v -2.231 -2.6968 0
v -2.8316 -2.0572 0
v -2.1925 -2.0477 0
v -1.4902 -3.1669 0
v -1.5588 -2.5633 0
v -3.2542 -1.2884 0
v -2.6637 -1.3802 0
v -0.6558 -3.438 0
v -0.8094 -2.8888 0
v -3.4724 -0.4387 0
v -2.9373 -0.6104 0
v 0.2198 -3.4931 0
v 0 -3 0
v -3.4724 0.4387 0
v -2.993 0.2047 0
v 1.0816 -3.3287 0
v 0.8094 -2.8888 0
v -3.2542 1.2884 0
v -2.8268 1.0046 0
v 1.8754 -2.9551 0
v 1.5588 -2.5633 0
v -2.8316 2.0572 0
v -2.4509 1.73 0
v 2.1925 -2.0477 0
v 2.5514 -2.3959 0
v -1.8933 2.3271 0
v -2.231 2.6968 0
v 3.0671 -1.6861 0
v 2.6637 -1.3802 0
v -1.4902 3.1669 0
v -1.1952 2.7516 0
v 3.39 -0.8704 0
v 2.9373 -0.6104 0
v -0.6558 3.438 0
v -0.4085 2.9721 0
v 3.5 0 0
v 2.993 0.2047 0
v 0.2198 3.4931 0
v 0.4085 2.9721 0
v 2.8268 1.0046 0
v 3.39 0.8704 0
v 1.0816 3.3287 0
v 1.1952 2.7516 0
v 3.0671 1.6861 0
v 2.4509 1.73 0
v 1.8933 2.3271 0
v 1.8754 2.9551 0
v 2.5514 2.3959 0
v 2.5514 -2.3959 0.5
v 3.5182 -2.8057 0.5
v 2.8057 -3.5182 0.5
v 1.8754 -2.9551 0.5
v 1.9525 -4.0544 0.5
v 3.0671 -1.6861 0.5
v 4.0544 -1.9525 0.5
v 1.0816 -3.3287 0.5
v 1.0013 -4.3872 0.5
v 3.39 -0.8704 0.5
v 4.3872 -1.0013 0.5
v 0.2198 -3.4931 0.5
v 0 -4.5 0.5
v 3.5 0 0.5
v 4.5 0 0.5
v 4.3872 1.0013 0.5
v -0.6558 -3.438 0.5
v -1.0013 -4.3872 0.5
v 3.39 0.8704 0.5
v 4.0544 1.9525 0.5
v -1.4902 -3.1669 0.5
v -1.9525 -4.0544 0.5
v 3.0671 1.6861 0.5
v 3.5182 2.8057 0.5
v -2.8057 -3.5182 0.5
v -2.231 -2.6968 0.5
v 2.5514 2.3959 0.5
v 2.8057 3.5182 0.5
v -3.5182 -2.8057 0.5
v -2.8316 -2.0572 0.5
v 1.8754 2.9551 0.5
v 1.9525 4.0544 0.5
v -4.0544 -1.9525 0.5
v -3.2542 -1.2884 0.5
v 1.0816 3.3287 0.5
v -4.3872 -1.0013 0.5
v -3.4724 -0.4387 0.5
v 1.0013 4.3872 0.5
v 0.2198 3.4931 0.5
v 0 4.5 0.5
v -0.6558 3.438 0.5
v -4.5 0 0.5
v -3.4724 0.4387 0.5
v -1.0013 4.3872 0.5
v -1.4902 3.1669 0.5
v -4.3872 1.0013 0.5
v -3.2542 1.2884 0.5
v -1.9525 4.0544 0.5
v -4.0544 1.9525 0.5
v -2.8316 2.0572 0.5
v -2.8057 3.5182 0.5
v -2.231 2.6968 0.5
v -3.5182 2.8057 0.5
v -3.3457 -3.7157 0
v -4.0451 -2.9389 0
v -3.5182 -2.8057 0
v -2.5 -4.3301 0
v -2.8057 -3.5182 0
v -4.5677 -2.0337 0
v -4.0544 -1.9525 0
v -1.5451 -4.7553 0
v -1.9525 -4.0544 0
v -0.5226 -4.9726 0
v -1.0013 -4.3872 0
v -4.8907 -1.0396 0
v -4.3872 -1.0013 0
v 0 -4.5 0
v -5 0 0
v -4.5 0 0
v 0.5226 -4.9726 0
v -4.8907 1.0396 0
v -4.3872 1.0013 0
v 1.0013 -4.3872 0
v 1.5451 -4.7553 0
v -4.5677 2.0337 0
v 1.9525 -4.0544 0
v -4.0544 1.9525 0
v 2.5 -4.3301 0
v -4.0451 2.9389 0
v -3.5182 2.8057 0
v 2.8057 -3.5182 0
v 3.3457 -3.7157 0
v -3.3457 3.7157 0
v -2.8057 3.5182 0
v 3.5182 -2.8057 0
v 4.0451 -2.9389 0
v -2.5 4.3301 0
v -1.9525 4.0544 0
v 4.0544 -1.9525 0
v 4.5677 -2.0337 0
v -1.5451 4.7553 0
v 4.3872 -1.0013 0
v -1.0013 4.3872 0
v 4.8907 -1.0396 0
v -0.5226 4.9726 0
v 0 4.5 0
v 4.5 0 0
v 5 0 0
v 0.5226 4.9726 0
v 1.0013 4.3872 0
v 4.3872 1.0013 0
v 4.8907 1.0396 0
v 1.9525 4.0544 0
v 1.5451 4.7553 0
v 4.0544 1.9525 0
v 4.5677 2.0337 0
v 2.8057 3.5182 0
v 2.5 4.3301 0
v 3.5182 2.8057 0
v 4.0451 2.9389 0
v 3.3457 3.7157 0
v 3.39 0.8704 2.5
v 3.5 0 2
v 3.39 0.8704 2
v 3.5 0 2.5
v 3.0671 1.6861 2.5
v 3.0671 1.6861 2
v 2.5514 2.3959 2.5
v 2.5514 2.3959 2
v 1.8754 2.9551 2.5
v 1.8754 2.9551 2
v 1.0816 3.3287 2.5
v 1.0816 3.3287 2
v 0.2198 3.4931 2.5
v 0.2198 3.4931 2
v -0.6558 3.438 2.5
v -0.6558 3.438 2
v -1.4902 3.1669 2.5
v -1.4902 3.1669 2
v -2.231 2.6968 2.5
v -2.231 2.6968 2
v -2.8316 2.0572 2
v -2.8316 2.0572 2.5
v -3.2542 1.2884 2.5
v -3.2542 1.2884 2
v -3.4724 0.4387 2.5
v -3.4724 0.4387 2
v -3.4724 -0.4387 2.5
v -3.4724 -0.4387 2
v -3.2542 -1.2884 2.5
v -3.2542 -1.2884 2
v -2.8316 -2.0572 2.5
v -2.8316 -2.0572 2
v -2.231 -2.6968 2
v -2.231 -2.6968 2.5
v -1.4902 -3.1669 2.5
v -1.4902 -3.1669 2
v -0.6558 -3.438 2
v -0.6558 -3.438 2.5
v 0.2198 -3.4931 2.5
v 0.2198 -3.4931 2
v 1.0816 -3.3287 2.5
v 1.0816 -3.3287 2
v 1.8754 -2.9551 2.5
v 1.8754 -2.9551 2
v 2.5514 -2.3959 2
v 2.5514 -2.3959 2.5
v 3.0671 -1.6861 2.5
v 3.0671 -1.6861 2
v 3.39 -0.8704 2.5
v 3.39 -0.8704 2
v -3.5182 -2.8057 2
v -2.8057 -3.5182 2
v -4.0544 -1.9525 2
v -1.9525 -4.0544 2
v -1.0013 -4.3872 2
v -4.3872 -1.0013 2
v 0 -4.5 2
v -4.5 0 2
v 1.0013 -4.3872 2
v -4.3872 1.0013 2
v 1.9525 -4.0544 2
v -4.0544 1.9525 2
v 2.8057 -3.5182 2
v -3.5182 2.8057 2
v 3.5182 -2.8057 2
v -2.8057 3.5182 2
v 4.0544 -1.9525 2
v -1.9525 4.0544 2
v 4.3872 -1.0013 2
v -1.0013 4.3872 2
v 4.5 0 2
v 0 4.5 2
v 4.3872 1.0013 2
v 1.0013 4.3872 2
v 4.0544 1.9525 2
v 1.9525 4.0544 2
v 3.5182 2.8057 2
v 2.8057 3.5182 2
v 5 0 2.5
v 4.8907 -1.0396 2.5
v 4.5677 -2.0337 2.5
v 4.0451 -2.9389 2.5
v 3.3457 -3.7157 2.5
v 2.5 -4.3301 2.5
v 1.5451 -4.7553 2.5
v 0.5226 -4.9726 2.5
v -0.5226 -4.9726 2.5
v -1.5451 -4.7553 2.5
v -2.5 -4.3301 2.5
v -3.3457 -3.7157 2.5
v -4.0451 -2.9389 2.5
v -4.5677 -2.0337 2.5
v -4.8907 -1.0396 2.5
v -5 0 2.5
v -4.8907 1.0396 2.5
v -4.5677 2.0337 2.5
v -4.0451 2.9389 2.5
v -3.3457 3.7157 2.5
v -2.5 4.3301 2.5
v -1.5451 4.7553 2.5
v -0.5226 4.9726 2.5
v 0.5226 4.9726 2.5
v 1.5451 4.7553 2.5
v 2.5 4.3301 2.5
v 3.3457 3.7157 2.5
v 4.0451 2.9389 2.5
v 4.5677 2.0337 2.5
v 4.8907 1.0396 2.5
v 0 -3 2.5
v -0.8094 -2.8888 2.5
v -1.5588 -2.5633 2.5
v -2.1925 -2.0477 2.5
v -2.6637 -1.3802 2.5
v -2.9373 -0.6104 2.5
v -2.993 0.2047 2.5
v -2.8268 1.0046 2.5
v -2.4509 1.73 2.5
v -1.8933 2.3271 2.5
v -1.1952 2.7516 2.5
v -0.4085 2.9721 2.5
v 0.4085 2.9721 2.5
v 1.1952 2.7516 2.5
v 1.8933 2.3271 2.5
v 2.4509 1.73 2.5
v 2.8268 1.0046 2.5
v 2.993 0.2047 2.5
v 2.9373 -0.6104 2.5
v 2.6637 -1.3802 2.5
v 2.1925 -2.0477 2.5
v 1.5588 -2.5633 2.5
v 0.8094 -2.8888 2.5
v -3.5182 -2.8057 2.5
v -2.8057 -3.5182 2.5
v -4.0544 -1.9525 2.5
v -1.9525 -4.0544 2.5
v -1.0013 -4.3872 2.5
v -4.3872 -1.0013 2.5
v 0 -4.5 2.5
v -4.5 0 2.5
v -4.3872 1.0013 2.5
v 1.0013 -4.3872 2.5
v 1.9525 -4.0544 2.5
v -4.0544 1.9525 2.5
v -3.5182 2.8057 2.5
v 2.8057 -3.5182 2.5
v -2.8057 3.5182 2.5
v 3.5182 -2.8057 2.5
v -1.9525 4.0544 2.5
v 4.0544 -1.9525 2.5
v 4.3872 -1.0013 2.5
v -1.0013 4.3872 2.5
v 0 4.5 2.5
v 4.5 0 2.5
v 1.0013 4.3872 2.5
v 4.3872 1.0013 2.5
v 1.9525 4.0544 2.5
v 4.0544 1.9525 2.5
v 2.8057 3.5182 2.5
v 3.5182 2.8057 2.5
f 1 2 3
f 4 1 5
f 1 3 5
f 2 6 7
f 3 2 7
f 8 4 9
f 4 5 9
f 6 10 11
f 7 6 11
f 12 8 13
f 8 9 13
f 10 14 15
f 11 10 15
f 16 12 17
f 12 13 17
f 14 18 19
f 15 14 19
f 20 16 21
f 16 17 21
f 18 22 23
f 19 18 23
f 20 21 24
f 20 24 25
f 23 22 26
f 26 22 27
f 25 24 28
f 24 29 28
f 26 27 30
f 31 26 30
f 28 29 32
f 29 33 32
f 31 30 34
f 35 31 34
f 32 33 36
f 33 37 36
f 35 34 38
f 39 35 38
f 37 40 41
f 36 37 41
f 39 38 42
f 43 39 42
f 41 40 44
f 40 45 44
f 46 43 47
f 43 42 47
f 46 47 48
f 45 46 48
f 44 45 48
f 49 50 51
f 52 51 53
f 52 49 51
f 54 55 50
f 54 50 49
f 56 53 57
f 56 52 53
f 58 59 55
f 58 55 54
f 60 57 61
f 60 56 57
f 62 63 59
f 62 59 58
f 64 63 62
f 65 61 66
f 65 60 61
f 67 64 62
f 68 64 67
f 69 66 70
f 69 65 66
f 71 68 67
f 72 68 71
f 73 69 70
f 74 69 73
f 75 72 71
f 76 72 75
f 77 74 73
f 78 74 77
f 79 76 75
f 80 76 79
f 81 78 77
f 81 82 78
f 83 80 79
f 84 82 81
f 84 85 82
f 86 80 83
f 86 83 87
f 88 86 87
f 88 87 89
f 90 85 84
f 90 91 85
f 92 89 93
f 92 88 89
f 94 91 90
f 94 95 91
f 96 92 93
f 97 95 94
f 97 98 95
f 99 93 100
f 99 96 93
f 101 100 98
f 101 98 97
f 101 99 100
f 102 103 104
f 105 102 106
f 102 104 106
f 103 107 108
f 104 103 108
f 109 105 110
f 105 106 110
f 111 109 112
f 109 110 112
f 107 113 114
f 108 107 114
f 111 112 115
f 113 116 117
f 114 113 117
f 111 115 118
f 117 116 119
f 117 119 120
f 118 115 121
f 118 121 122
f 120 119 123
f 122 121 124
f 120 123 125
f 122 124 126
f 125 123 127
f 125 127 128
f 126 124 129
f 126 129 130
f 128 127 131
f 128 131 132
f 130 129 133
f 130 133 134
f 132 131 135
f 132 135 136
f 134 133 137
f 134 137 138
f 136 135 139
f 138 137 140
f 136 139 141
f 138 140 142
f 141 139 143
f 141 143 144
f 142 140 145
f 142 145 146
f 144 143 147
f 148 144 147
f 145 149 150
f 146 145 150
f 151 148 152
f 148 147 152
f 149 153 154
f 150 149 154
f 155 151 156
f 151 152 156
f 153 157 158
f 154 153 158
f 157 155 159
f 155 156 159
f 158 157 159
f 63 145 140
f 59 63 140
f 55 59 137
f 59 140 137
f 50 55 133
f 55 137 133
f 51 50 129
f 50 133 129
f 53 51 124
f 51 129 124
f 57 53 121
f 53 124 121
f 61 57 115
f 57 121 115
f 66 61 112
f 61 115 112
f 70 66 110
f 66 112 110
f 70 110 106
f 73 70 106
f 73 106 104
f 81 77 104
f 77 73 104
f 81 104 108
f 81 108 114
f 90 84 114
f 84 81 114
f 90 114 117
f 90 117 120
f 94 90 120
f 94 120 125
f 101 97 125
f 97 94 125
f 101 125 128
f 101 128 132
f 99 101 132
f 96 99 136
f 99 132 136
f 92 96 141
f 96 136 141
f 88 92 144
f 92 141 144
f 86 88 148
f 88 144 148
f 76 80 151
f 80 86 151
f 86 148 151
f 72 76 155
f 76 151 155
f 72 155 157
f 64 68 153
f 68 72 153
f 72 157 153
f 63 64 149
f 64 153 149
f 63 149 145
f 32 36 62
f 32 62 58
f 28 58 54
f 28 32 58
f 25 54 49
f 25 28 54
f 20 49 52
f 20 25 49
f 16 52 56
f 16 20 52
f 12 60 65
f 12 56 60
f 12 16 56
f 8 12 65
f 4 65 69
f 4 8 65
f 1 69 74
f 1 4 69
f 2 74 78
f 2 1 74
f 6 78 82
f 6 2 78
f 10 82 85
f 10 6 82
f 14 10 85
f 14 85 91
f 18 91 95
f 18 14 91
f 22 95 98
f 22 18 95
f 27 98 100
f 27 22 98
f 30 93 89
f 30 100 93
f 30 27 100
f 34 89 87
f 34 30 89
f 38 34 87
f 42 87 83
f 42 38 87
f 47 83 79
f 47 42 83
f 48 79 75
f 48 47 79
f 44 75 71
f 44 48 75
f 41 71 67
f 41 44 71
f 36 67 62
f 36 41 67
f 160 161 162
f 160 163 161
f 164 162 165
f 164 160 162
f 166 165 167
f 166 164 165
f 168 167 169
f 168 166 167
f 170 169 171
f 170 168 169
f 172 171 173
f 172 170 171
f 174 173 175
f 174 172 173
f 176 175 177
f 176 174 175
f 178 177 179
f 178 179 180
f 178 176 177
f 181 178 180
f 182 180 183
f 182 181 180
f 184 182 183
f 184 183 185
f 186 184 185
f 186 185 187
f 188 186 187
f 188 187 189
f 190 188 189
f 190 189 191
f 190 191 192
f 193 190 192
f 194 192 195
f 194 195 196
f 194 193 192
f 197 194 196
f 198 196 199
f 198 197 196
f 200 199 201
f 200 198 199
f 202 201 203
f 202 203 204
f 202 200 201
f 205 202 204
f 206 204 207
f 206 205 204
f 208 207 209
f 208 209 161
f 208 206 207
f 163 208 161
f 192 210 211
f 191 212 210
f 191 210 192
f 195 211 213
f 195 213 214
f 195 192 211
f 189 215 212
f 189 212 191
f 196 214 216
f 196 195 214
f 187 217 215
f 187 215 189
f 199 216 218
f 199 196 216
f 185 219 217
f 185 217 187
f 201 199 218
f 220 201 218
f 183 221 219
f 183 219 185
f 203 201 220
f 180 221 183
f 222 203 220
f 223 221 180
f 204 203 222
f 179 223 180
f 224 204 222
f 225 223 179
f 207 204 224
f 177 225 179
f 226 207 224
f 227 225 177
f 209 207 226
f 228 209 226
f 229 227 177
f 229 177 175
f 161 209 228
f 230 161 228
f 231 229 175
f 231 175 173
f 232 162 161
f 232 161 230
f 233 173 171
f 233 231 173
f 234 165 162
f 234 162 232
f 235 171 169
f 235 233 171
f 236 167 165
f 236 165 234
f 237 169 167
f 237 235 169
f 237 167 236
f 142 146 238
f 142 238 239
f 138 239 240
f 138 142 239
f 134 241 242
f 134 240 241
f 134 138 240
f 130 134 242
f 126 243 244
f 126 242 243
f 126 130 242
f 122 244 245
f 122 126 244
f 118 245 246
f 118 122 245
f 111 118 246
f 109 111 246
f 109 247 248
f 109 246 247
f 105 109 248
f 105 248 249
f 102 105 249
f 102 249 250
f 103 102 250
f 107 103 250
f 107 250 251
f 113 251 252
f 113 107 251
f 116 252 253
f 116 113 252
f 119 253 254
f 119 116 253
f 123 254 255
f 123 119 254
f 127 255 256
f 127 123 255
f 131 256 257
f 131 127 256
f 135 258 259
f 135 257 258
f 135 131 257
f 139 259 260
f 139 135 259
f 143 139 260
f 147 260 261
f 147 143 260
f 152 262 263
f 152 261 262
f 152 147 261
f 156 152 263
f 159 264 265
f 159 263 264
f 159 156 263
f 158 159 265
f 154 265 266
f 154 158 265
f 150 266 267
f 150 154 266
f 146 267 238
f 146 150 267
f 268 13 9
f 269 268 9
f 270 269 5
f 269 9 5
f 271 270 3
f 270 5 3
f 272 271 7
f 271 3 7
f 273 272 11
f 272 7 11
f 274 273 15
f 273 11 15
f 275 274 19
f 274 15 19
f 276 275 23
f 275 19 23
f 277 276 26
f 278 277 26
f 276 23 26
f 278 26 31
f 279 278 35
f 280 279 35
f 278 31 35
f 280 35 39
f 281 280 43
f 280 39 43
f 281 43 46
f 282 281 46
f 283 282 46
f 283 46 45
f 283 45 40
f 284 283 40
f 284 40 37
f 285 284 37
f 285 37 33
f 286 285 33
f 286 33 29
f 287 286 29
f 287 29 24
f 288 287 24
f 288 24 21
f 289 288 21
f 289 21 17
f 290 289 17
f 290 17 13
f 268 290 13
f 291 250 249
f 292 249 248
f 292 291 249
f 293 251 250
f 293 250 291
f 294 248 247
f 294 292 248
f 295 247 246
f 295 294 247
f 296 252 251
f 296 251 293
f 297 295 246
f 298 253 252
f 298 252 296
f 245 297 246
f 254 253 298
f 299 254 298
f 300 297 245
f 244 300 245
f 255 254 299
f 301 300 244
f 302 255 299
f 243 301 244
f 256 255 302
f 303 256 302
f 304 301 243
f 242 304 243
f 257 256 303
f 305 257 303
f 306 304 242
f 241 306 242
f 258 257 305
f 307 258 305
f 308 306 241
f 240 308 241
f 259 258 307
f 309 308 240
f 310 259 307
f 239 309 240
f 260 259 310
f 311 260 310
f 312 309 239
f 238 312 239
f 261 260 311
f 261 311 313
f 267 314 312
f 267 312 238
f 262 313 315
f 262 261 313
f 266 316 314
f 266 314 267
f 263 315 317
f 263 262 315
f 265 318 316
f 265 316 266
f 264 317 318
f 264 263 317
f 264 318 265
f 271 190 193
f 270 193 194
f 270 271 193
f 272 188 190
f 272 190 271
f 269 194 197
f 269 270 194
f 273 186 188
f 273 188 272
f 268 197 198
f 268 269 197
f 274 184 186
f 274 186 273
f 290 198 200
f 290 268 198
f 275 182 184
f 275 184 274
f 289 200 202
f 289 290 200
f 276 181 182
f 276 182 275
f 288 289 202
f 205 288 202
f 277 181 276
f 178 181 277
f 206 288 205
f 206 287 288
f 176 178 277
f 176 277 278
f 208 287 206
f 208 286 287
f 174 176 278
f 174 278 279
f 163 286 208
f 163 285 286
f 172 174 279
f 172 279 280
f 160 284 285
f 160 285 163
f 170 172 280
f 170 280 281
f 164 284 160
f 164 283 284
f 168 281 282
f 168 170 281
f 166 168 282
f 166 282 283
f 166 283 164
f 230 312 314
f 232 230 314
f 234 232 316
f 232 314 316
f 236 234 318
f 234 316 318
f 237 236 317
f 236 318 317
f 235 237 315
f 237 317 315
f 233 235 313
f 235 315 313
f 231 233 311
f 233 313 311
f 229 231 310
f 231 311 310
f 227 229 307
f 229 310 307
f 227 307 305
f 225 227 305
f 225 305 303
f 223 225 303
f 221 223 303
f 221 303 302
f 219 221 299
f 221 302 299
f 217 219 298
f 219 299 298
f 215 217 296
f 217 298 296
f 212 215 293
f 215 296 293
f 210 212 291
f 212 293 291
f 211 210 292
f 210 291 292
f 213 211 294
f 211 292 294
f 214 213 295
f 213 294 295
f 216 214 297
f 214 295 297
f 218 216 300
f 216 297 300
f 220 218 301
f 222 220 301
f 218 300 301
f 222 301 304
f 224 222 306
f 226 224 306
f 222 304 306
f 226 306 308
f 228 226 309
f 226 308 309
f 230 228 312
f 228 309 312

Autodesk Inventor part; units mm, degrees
ref_plane "YZ Plane" through (0, 0, 0) normal (1, 0, 0) x (0, 1, 0)
ref_plane "XZ Plane" through (0, 0, 0) normal (0, 1, 0) x (-1, 0, 0)
sketch "Sketch1" plane through (0, 0, 0) normal (0, 0, 1) x (1, 0, 0)
  circle A0 centre (0, 0) radius 5
  dimension "d0" = 10
extrude "Extrusion1" add sketch "Sketch1" along normal blind 2.5
hole "Hole1" at (0, 0, 2.5) direction (0, 0, -1) diameter 6 end through all
sketch "Sketch2" plane through (0, 0, 2.5) normal (0, 0, 1) x (1, 0, 0)
  circle A0 centre (0, 0) radius 4.5
  circle A1 centre (0, 0) radius 3.5
  dimension "d12" = 9
  dimension "d13" = 7
extrude "Extrusion2" cut sketch "Sketch2" against normal blind 0.5
ref_plane "Work Plane1" through (0, 0, 1.25) normal (0, 0, 1) x (1, 0, 0)
mirror "Mirror1" about plane through (0, 0, 1.25) normal (0, 0, 1) of "Extrusion2"
properties part number "bearing_6x10x2,5" material "Stainless Steel"
